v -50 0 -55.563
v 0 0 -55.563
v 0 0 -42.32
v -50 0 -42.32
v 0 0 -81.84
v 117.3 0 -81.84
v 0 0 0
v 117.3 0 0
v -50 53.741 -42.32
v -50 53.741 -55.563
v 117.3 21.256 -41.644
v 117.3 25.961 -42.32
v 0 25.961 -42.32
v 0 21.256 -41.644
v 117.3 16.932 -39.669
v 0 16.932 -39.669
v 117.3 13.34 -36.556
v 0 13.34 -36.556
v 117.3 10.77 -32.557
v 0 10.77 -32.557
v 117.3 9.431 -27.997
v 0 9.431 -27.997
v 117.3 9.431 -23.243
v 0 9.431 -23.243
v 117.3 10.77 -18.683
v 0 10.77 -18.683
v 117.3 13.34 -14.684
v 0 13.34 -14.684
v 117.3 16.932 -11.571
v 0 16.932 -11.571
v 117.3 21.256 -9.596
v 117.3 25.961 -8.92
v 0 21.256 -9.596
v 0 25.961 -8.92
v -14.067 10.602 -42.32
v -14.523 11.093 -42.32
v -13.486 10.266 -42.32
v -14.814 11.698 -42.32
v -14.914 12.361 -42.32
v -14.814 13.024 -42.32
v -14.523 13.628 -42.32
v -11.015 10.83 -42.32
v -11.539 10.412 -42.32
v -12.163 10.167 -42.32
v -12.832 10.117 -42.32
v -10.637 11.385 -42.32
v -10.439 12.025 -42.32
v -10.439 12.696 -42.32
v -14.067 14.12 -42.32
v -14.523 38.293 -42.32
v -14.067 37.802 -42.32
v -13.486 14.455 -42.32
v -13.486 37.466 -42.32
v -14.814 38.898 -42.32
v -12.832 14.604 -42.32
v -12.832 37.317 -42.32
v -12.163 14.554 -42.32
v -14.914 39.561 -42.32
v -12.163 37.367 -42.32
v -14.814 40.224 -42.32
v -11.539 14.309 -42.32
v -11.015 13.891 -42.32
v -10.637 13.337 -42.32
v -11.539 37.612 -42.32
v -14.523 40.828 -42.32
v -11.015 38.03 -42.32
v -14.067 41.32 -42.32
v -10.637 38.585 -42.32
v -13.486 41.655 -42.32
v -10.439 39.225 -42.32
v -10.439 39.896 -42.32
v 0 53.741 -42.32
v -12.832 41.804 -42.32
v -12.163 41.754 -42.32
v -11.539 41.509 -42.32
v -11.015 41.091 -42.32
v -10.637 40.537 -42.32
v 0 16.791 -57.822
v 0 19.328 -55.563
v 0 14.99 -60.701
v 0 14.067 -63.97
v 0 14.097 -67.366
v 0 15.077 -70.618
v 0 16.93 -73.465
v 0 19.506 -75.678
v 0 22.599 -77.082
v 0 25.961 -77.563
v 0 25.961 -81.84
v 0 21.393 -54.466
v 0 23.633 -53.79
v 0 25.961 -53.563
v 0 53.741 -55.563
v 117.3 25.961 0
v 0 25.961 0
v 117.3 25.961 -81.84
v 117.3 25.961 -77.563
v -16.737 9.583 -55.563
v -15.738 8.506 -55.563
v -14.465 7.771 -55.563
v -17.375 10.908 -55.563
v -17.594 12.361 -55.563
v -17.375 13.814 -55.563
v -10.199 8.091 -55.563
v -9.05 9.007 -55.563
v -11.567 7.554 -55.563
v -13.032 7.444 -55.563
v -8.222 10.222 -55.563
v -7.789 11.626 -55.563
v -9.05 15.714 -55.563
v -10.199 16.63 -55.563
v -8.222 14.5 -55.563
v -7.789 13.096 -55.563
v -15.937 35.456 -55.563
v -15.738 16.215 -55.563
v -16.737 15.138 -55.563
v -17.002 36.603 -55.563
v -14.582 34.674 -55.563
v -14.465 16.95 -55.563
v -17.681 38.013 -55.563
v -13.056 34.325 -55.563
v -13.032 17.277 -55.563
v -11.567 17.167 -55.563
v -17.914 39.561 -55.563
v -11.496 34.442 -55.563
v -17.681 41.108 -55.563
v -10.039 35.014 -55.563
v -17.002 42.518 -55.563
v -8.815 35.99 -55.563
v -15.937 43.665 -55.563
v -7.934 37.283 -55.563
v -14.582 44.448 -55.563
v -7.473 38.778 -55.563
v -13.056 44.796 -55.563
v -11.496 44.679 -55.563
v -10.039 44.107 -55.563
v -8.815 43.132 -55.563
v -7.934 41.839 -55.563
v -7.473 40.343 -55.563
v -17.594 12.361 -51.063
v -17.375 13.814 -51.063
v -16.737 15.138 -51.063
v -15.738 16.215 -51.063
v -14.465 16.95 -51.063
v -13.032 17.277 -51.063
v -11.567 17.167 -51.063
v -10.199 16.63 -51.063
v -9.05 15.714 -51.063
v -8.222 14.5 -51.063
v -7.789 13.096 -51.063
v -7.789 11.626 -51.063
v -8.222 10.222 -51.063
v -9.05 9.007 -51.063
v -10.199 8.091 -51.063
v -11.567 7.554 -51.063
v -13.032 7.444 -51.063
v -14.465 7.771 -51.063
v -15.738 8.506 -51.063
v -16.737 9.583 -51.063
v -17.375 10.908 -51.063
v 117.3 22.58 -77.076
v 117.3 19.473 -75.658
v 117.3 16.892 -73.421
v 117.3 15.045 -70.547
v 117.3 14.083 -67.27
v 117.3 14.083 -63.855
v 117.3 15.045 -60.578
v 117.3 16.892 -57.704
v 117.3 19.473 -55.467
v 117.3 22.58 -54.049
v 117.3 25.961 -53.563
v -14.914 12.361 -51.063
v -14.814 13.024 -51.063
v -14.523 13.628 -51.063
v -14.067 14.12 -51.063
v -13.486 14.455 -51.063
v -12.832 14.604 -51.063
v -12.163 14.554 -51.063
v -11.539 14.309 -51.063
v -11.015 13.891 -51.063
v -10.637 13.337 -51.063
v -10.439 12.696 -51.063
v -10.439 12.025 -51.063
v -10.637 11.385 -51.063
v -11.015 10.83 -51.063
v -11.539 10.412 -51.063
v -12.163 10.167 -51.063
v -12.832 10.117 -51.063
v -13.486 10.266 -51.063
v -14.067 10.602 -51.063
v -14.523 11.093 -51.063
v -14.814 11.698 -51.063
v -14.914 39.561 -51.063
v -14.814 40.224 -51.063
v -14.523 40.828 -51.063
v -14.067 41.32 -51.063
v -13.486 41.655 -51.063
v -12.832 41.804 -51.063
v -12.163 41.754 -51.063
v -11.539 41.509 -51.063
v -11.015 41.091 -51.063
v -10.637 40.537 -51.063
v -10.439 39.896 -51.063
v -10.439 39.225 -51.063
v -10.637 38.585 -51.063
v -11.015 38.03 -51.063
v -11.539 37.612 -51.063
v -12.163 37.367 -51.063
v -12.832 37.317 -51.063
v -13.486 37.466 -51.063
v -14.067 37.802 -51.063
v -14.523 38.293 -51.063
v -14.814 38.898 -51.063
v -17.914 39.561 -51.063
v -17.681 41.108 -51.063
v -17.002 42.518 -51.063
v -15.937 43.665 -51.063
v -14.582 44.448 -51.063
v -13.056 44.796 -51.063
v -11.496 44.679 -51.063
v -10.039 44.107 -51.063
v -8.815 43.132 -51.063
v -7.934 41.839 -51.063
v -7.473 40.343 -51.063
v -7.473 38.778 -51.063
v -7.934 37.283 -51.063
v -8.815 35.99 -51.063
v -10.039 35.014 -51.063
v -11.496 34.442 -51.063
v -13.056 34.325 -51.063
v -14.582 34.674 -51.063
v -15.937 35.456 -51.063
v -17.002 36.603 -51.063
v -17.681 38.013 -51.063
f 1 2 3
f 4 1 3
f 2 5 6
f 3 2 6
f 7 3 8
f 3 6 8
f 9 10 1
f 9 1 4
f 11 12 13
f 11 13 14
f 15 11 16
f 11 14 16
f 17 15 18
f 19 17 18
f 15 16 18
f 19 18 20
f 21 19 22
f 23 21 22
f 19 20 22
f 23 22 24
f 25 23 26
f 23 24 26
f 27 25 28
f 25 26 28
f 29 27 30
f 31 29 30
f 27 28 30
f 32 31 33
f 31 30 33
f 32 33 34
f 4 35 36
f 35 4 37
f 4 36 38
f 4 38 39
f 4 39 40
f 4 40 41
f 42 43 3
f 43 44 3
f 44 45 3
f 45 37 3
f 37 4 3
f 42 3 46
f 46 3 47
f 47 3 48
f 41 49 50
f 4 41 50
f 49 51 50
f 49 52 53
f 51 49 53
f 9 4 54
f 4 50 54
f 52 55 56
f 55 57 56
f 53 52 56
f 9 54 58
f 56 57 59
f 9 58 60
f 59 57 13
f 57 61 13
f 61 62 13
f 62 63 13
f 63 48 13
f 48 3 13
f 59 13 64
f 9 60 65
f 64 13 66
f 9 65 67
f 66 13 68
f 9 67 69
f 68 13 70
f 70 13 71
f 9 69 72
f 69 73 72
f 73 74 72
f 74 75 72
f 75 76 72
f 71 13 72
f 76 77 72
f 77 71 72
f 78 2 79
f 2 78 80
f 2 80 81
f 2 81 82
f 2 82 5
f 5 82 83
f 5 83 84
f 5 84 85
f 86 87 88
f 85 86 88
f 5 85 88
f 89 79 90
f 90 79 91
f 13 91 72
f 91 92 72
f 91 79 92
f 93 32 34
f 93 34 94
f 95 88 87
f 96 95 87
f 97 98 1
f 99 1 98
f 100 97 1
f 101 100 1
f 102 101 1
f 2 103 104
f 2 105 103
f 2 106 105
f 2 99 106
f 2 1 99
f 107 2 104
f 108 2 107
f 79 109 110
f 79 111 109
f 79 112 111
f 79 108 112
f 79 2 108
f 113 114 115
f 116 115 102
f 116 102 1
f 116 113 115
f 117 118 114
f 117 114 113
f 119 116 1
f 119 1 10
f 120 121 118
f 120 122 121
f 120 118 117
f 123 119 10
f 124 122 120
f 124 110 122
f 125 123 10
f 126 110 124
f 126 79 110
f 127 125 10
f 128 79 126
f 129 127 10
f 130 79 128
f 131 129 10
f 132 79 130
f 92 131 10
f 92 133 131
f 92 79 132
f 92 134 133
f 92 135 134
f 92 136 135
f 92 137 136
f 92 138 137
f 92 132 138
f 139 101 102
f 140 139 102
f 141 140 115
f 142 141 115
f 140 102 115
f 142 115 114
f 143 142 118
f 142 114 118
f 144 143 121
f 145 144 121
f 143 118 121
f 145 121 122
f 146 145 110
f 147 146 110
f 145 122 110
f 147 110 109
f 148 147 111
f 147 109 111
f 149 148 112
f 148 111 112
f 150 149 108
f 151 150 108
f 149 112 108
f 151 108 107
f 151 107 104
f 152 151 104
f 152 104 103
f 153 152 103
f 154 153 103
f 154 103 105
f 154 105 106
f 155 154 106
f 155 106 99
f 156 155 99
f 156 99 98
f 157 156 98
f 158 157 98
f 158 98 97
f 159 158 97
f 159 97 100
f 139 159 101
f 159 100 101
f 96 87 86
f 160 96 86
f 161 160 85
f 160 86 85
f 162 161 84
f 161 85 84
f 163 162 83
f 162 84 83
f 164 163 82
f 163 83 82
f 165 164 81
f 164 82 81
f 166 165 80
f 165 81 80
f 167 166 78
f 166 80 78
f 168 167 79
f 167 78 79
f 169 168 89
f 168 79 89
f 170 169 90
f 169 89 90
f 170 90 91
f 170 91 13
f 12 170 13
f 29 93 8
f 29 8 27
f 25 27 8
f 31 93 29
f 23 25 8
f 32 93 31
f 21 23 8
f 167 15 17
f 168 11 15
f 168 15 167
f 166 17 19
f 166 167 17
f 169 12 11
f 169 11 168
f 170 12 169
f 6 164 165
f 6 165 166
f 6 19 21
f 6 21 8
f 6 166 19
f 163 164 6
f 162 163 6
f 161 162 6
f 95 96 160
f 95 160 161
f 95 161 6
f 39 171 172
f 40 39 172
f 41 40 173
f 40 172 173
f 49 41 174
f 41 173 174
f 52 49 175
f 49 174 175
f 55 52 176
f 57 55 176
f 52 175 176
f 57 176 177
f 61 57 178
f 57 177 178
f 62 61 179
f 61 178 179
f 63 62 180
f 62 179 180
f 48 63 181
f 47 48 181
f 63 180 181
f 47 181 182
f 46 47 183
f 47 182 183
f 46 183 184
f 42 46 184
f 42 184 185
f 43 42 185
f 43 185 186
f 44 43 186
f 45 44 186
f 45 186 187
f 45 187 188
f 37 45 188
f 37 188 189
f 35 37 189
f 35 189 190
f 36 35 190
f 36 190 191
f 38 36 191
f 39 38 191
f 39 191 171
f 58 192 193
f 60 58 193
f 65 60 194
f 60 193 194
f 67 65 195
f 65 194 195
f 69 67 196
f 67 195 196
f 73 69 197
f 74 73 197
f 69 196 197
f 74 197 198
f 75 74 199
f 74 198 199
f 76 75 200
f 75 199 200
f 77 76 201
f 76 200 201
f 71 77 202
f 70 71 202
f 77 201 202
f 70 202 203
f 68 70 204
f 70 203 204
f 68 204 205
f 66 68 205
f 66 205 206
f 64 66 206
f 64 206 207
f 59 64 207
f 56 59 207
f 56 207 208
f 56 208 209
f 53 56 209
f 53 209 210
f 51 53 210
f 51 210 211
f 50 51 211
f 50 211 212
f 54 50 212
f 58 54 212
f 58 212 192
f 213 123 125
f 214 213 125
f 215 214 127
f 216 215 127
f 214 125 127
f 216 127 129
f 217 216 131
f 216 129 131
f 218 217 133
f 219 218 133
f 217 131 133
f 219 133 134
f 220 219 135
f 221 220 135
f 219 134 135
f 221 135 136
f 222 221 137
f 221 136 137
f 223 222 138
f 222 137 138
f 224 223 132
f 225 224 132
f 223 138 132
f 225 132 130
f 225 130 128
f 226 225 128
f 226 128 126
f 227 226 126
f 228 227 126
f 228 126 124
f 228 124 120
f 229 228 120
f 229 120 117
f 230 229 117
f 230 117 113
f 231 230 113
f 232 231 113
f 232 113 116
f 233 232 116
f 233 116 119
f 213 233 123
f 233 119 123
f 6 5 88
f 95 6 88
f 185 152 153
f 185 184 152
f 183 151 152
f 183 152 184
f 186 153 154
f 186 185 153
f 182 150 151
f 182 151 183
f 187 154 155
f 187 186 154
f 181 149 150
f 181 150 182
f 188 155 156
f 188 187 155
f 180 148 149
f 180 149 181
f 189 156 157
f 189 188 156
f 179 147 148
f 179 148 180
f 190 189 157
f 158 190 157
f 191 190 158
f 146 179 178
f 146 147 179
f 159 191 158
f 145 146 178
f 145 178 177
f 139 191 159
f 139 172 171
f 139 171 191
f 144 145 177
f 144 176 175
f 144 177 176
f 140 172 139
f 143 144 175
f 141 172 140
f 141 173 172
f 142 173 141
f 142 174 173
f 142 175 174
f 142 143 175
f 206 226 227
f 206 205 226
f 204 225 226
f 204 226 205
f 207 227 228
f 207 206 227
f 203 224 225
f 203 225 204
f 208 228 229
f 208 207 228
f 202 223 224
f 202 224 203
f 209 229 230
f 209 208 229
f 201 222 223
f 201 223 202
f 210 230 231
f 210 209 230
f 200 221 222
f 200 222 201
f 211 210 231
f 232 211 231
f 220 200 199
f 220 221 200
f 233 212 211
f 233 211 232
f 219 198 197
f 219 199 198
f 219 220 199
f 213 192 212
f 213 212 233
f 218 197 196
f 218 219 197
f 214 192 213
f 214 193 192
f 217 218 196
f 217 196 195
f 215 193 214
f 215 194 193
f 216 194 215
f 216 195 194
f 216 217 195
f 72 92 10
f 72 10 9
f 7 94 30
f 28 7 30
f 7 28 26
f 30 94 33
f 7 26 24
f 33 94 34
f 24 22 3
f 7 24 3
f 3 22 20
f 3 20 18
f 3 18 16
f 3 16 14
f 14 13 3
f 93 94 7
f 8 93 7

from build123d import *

# Parameters (mm, degrees)
BOSS_EXTRUDE1_DEPTH = 117.3
SKETCH7_W           = 13.242480008
SKETCH7_H           = 53.740928499
BOSS_EXTRUDE2_DEPTH = 50
SKETCH8_R           = 2.25
CUT_EXTRUDE1_DEPTH  = 13.242480008
SKETCH9_R           = 5.25
SKETCH9_R_2         = 4.930225291
CUT_EXTRUDE2_DEPTH  = 4.5


with BuildPart() as part:
    # Sketch1 → Boss-Extrude1 (new body)
    with BuildSketch(Plane(origin=(0, 0, 0), x_dir=(0, 0, -1), z_dir=(1, 0, 0))):
        with BuildLine():
            Line((0, 0), (81.840140947, 0))
            Line((81.840140947, 0), (81.840140947, 25.960755084))
            Line((81.840140947, 25.960755084), (77.562505861, 25.960755084))
            ThreePointArc((77.562505861, 25.960755084), (65.562505861, 13.960755084), (53.562505861, 25.960755084))
            Line((53.562505861, 25.960755084), (42.320025853, 25.960755084))
            ThreePointArc((42.320025853, 25.960755084), (25.620025853, 9.260755084), (8.920025853, 25.960755084))
            Line((8.920025853, 25.960755084), (0, 25.960755084))
            Line((0, 25.960755084), (0, 0))
        make_face()
    extrude(amount=BOSS_EXTRUDE1_DEPTH)

    # Sketch7 → Boss-Extrude2 (add)
    with BuildSketch(Plane.ZY):
        with Locations((-48.941265857, 26.87046425)):
            Rectangle(SKETCH7_W, SKETCH7_H)
    extrude(amount=BOSS_EXTRUDE2_DEPTH)

    # Sketch8 → Cut-Extrude1 (cut)
    with BuildSketch(Plane(origin=(0, 0, -55.562505861), x_dir=(-1, 0, 0), z_dir=(0, 0, -1))):
        with Locations((12.663905134, 39.560755084)):
            Circle(SKETCH8_R)
        with Locations((12.663905134, 12.360755084)):
            Circle(SKETCH8_R)
    extrude(amount=-CUT_EXTRUDE1_DEPTH, mode=Mode.SUBTRACT)

    # Sketch9 → Cut-Extrude2 (cut)
    with BuildSketch(Plane(origin=(0, 0, -55.562505861), x_dir=(-1, 0, 0), z_dir=(0, 0, -1))):
        with Locations((12.663905134, 39.560755084)):
            Circle(SKETCH9_R)
        with Locations((12.663905134, 12.360755084)):
            Circle(SKETCH9_R_2)
    extrude(amount=-CUT_EXTRUDE2_DEPTH, mode=Mode.SUBTRACT)


solid = part.part
